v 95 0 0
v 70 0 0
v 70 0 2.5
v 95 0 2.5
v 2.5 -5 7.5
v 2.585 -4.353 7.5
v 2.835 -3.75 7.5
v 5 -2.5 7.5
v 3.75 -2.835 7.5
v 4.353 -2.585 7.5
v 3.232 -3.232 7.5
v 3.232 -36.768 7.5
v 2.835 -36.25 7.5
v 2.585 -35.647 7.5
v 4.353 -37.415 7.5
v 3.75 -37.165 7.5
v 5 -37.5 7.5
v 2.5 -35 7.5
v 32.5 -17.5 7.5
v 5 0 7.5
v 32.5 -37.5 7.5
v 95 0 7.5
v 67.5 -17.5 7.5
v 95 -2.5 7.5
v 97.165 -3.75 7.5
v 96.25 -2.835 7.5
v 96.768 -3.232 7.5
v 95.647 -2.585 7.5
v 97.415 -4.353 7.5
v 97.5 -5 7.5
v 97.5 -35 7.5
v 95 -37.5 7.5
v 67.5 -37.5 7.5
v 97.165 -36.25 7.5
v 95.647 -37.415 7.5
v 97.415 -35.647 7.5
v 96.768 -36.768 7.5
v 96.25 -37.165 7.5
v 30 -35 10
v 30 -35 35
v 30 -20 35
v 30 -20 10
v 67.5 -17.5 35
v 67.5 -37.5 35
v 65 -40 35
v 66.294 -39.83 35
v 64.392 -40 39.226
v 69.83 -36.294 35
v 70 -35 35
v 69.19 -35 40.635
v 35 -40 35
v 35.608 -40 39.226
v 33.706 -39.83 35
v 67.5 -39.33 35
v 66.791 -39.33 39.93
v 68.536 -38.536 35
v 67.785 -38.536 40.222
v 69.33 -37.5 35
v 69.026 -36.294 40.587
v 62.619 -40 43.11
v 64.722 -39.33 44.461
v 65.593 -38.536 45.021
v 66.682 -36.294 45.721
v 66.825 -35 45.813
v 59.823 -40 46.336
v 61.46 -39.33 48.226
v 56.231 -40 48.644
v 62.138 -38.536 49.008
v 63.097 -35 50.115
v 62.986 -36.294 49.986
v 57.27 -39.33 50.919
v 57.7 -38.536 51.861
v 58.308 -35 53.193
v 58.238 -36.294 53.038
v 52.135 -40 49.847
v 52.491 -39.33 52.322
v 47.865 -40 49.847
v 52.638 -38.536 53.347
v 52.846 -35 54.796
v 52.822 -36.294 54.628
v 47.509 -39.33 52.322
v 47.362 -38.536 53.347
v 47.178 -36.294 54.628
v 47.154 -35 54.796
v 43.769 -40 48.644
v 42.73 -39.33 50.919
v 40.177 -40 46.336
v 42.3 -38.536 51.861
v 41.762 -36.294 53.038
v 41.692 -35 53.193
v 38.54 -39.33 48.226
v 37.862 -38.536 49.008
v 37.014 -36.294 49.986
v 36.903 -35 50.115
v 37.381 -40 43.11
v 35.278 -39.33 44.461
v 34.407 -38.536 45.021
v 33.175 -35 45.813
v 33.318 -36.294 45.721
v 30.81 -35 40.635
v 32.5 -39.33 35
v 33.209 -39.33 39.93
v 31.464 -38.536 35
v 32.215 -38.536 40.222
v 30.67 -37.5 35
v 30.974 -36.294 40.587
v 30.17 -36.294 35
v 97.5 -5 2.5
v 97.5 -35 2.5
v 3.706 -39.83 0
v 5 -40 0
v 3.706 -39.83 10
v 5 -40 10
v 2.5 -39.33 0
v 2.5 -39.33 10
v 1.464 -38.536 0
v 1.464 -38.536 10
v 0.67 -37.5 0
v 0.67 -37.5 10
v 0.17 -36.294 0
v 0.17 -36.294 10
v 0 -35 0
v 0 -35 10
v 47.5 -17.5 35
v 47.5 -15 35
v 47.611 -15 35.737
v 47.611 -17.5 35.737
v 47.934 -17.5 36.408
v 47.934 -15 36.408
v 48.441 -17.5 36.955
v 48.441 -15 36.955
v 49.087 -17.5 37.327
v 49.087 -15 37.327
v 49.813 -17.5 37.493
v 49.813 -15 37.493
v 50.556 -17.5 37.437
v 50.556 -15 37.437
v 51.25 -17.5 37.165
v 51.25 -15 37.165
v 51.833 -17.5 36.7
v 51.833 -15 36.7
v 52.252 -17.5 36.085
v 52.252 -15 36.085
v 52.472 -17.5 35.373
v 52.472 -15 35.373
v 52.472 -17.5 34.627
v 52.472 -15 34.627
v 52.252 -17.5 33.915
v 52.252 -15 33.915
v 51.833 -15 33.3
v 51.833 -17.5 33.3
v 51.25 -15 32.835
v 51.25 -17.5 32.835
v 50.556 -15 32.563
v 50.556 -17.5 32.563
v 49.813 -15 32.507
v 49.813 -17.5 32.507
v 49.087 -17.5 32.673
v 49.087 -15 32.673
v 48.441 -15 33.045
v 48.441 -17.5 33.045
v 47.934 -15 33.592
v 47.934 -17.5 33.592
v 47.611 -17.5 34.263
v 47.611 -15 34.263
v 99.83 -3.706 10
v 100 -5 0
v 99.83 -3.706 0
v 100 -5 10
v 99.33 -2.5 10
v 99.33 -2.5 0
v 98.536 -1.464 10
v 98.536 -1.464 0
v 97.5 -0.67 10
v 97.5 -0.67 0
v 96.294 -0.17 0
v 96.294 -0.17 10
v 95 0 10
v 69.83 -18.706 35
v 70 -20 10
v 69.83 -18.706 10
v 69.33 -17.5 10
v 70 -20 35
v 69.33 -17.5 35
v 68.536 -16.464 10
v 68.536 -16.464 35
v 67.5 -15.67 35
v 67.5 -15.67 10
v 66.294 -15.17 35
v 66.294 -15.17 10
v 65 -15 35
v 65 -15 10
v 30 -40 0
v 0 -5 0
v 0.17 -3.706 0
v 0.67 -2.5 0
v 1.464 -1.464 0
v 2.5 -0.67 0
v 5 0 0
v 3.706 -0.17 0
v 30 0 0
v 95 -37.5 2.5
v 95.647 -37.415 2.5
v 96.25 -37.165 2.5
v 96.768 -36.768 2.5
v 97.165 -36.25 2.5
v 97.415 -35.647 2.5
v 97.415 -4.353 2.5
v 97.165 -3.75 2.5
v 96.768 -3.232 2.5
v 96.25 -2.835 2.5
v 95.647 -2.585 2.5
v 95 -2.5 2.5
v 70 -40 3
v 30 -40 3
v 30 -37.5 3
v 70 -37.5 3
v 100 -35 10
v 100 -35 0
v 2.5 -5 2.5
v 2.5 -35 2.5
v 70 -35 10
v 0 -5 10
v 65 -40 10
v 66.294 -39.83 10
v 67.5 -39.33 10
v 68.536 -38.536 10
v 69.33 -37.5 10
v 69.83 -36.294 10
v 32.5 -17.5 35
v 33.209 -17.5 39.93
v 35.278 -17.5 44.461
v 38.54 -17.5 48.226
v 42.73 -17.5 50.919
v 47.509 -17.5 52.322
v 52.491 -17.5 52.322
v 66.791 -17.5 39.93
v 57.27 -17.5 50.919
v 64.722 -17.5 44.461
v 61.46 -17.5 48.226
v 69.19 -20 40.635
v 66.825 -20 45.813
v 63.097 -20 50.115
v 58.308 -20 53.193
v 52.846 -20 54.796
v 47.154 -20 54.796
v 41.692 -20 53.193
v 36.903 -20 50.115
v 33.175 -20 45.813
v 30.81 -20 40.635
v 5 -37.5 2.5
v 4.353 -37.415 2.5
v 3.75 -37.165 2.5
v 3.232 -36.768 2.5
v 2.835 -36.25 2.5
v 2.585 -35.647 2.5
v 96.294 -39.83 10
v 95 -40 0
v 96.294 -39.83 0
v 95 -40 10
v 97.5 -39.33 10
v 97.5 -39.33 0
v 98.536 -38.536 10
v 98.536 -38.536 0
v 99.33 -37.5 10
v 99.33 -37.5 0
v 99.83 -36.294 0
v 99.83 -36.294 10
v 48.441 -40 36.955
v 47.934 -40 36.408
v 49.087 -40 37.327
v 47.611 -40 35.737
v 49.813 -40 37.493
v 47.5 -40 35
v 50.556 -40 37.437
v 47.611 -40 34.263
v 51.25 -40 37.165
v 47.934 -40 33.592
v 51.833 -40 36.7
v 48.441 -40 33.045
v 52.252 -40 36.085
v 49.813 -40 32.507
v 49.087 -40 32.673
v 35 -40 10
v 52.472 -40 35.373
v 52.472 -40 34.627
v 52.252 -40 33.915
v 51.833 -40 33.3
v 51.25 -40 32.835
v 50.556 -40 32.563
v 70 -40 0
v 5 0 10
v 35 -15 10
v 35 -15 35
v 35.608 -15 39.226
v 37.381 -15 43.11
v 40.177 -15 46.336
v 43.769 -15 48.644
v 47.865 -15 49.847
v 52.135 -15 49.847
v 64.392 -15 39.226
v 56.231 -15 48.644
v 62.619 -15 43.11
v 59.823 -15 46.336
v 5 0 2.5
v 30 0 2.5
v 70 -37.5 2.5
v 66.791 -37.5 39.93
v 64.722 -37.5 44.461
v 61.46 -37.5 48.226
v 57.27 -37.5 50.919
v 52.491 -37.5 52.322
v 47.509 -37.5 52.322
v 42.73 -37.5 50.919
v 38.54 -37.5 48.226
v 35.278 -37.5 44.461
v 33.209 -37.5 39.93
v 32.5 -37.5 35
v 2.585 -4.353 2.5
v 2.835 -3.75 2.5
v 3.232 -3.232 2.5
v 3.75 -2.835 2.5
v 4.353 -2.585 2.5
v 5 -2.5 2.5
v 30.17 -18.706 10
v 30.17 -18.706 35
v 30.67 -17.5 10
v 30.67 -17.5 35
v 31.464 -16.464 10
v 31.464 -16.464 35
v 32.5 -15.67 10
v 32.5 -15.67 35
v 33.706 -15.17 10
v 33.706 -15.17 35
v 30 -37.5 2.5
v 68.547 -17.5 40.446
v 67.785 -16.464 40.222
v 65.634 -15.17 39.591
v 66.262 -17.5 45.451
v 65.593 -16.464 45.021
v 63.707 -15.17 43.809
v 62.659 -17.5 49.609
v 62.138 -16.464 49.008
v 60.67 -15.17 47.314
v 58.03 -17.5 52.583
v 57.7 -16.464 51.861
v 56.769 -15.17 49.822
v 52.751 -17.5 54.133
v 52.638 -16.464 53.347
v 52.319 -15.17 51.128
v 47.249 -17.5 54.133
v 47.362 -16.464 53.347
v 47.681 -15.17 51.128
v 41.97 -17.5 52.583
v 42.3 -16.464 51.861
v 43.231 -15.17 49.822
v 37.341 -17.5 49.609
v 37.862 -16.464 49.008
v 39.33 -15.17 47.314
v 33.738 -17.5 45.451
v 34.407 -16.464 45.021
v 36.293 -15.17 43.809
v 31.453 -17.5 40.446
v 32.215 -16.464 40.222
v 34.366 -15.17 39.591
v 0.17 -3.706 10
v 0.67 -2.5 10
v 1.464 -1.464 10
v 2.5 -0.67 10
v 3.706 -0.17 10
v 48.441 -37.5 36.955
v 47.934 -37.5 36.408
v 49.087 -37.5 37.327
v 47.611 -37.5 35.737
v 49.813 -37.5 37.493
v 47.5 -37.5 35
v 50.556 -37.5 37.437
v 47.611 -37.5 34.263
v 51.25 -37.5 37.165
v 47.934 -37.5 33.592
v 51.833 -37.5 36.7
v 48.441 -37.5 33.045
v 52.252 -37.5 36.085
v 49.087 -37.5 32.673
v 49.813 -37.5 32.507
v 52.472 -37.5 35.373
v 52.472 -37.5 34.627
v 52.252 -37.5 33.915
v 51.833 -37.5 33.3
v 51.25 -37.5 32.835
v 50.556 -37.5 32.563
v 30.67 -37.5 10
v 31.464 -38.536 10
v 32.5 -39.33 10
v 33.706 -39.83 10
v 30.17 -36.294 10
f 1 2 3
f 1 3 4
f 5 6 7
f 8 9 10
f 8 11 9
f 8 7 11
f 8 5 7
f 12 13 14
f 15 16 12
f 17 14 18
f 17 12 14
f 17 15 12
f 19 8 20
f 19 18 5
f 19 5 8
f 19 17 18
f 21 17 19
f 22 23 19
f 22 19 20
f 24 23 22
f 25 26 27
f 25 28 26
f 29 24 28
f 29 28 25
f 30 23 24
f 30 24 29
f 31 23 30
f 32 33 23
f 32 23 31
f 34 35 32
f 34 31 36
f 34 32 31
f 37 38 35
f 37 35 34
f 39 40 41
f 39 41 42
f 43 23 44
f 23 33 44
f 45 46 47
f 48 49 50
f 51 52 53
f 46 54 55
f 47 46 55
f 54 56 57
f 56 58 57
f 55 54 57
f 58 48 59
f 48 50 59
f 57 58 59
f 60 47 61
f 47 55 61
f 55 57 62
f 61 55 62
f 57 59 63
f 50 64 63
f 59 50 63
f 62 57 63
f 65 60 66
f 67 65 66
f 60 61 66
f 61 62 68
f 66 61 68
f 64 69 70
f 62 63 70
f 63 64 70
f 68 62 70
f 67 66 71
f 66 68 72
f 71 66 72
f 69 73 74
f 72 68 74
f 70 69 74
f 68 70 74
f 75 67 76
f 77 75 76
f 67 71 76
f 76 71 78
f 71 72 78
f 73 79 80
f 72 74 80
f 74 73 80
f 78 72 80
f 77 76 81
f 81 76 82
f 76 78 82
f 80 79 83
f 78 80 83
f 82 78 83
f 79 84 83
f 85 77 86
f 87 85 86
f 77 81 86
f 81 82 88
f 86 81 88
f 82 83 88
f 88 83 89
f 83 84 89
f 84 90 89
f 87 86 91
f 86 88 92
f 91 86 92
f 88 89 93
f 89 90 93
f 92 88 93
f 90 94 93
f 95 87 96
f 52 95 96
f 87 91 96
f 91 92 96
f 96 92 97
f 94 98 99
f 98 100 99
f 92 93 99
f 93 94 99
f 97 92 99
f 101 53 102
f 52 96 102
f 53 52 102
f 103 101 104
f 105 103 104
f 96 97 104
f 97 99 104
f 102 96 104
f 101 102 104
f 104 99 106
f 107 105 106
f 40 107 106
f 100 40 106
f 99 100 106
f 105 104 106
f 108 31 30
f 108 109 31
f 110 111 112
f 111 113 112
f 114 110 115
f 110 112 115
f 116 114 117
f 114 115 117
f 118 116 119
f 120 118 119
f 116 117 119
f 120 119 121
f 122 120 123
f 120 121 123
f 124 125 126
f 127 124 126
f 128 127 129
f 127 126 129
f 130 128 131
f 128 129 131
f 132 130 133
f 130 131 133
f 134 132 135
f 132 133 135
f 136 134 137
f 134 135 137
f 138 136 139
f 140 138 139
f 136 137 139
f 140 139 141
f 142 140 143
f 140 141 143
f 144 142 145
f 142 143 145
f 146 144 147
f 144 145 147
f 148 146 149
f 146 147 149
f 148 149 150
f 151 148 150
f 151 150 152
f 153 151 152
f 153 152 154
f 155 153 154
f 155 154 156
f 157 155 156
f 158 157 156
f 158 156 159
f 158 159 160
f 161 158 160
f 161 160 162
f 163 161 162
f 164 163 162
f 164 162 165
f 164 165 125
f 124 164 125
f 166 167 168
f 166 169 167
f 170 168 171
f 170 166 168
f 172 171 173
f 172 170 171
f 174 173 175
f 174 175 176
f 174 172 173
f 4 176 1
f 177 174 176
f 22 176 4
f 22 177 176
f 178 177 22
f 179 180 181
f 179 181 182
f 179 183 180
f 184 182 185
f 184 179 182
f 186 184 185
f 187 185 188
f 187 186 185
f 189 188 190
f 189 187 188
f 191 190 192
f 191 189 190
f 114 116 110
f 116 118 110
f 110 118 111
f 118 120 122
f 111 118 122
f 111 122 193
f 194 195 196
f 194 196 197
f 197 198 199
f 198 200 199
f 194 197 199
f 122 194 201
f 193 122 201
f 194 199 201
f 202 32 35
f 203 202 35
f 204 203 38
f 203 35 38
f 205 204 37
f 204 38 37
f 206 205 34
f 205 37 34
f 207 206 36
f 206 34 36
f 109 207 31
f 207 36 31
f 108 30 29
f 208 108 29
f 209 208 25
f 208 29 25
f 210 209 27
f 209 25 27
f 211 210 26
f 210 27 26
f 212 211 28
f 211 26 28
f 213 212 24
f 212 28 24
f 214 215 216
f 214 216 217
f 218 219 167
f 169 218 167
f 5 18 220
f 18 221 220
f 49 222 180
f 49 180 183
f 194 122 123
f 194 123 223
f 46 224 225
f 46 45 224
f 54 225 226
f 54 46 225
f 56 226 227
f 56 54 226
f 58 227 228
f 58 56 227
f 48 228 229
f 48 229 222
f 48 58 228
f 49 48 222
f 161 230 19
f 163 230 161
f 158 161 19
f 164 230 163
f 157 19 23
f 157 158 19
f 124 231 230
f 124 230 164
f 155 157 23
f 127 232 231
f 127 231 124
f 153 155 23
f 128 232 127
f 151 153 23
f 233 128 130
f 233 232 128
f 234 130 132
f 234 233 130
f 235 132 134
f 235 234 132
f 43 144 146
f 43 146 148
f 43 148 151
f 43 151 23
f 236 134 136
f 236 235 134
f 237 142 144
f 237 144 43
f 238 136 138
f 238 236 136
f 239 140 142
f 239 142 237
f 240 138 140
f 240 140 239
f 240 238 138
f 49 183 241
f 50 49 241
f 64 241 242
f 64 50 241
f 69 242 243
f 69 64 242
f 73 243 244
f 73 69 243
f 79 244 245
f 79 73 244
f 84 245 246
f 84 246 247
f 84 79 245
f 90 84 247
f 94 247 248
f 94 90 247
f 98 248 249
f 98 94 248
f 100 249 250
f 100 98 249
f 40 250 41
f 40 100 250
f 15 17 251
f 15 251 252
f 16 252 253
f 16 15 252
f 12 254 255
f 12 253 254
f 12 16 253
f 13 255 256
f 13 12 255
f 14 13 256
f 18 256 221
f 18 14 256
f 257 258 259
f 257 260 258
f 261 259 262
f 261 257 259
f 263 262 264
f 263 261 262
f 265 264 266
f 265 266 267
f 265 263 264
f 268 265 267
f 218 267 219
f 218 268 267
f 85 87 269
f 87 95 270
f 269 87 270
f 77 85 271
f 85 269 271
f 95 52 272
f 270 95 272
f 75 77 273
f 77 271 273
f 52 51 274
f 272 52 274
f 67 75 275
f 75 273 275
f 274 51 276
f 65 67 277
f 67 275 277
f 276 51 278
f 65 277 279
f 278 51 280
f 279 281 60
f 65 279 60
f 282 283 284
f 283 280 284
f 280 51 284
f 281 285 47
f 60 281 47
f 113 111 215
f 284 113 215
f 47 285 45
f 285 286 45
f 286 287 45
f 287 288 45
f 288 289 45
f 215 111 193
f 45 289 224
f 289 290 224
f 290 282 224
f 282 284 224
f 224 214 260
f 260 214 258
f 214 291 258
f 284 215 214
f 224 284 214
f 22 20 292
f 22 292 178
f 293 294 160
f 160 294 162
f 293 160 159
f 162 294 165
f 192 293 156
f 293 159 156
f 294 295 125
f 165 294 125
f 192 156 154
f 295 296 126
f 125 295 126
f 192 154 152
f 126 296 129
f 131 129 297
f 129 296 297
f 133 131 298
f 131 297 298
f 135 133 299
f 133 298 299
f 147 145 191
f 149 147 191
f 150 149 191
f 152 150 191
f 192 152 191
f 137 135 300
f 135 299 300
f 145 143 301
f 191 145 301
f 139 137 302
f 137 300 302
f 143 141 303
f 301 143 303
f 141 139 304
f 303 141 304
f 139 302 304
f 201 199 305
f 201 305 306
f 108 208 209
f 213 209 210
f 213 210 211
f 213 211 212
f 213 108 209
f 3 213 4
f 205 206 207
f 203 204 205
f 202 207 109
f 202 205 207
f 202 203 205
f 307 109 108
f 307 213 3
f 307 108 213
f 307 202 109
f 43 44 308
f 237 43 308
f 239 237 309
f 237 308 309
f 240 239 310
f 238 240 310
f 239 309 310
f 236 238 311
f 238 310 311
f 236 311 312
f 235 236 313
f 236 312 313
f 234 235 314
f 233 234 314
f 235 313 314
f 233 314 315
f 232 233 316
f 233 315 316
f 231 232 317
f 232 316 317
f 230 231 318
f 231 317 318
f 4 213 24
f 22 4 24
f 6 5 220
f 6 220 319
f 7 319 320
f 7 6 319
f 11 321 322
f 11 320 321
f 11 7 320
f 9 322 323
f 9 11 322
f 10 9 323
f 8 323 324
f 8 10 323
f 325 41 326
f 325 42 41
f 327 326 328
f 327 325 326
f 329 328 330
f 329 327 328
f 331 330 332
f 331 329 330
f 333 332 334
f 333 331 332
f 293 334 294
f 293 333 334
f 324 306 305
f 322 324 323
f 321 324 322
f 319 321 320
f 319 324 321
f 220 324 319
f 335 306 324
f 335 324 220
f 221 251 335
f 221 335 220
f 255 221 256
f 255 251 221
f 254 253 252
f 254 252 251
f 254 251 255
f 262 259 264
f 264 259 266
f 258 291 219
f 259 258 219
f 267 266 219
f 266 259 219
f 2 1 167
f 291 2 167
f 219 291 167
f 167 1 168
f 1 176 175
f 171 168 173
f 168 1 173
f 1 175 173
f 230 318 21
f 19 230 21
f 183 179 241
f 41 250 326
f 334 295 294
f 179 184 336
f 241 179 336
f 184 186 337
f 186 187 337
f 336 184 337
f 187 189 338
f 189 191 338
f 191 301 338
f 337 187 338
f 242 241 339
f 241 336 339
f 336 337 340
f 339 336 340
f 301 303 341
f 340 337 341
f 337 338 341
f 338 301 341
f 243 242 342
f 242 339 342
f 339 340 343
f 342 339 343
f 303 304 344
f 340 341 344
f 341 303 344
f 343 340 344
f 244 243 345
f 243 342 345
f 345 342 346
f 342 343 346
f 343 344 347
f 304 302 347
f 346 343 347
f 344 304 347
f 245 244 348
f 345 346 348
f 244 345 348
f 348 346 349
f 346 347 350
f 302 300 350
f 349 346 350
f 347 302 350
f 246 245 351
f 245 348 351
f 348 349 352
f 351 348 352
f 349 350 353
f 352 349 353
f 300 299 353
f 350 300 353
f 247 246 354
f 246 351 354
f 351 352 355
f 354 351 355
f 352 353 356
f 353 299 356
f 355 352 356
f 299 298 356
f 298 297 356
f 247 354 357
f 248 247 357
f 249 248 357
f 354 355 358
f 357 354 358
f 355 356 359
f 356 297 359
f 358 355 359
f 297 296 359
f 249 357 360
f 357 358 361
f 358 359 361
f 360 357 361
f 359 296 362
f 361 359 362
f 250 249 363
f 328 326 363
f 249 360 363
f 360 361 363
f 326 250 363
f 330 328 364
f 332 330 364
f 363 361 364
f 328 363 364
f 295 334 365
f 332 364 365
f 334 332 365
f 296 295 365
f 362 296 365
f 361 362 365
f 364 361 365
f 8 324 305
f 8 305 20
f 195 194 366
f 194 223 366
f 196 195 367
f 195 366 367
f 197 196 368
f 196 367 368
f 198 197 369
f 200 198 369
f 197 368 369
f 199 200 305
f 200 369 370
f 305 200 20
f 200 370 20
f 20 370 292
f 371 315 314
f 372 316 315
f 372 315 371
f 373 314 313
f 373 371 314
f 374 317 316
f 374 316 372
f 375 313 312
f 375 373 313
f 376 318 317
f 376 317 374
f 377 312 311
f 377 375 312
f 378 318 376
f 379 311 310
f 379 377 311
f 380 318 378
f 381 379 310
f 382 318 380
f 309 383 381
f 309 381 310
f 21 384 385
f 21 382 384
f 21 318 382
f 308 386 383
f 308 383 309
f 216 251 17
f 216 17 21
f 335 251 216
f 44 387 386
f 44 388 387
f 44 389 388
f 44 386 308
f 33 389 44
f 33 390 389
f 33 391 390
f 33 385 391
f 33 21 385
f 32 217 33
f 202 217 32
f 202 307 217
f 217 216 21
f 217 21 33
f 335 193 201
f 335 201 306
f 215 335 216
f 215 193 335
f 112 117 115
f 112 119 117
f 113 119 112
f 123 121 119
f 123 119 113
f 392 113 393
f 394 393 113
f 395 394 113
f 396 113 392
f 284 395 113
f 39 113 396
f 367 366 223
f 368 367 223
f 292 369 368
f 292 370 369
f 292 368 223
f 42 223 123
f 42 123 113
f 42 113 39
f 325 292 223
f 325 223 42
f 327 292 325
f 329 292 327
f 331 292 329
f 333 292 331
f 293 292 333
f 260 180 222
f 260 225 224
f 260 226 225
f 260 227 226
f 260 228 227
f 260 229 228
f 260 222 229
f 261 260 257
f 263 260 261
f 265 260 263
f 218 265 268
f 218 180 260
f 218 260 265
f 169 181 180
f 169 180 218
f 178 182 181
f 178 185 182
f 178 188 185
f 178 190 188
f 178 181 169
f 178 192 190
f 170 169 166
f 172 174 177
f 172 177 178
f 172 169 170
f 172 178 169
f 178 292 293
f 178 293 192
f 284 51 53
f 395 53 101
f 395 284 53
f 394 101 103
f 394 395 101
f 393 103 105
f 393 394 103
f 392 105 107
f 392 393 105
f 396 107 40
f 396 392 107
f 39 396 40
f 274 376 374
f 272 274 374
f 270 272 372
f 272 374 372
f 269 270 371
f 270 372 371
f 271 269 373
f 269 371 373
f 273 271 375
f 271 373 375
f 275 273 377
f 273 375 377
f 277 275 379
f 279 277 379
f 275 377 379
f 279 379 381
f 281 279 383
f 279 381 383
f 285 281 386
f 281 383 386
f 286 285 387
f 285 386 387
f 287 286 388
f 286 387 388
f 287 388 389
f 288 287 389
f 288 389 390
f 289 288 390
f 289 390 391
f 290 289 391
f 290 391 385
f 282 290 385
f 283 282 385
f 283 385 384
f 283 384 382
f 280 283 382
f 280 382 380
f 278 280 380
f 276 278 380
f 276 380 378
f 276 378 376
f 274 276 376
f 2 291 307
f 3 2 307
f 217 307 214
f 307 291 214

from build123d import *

# Parameters (mm, degrees)
F0_W      = 100
F0_H      = 40
F1_DEPTH  = 10
F3_R      = 5
F4_R      = 5
F5_R      = 5
F6_R      = 5
F7_DEPTH  = 25
F8_T      = -2.5
F9_R      = 5
F10_R     = 5
F12_D     = 5
F13_W     = 40
F13_H     = 3
F14_DEPTH = 40.001


# Not quite as in the source:
# - a shell that OpenCascade refuses in one call is made with other operations: the cavity is built on its own and cut out


with BuildPart() as f1:
    # F0 (on Top) → F1 (new body)
    with BuildSketch(Plane.XY):
        with Locations((50, -20)):
            Rectangle(F0_W, F0_H)
    extrude(amount=F1_DEPTH)

    # F3
    f3_edges = [f1.edges().sort_by_distance(p)[0] for p in [
        (100, -40, 5),
    ]]
    fillet(f3_edges, radius=F3_R)

    # F4
    f4_edges = [f1.edges().sort_by_distance(p)[0] for p in [
        (100, 0, 5),
    ]]
    fillet(f4_edges, radius=F4_R)

    # F5
    f5_edges = [f1.edges().sort_by_distance(p)[0] for p in [
        (0, -40, 5),
    ]]
    fillet(f5_edges, radius=F5_R)

    # F6
    f6_edges = [f1.edges().sort_by_distance(p)[0] for p in [
        (0, 0, 5),
    ]]
    fillet(f6_edges, radius=F6_R)

    # F2 (on face) → F7 (join)
    with BuildSketch(Plane.XZ.offset(40)):
        with BuildLine():
            Line((30, 35), (30, 10))
            Line((30, 10), (70, 10))
            Line((70, 10), (70, 35))
            ThreePointArc((70, 35), (50, 55), (30, 35))
        make_face()
    extrude(amount=-F7_DEPTH)

    # F8: a shell. OpenCascade refuses it in one call, so the cavity is built on its own and cut out:
    # the body offset inwards by the wall thickness, plus a prism from it out through each open face.
    f8_core = offset(f1.part, amount=F8_T, kind=Kind.INTERSECTION, mode=Mode.PRIVATE)
    f8_exits = [f8_core.faces().sort_by_distance(p)[0] for p in [
        (50, -2.5, 5),
    ]]
    add(f8_core, mode=Mode.SUBTRACT)
    extrude(f8_exits, amount=-F8_T, mode=Mode.SUBTRACT)

    # F9
    f9_edges = [f1.edges().sort_by_distance(p)[0] for p in [
        (30, -40, 22.5),
    ]]
    fillet(f9_edges, radius=F9_R)

    # F10
    f10_edges = [f1.edges().sort_by_distance(p)[0] for p in [
        (30, -15, 22.5),
    ]]
    fillet(f10_edges, radius=F10_R)

    # F12 (through all)
    with Locations(Plane.XZ.offset(40)):
        with Locations((50, 35)):
            Hole(F12_D / 2)

    # F13 (on face) → F14 (cut, through all)
    with BuildSketch(Plane.XZ.offset(40)):
        with Locations((50, 1.5)):
            Rectangle(F13_W, F13_H)
    extrude(amount=-F14_DEPTH, mode=Mode.SUBTRACT)


solid = f1.part
